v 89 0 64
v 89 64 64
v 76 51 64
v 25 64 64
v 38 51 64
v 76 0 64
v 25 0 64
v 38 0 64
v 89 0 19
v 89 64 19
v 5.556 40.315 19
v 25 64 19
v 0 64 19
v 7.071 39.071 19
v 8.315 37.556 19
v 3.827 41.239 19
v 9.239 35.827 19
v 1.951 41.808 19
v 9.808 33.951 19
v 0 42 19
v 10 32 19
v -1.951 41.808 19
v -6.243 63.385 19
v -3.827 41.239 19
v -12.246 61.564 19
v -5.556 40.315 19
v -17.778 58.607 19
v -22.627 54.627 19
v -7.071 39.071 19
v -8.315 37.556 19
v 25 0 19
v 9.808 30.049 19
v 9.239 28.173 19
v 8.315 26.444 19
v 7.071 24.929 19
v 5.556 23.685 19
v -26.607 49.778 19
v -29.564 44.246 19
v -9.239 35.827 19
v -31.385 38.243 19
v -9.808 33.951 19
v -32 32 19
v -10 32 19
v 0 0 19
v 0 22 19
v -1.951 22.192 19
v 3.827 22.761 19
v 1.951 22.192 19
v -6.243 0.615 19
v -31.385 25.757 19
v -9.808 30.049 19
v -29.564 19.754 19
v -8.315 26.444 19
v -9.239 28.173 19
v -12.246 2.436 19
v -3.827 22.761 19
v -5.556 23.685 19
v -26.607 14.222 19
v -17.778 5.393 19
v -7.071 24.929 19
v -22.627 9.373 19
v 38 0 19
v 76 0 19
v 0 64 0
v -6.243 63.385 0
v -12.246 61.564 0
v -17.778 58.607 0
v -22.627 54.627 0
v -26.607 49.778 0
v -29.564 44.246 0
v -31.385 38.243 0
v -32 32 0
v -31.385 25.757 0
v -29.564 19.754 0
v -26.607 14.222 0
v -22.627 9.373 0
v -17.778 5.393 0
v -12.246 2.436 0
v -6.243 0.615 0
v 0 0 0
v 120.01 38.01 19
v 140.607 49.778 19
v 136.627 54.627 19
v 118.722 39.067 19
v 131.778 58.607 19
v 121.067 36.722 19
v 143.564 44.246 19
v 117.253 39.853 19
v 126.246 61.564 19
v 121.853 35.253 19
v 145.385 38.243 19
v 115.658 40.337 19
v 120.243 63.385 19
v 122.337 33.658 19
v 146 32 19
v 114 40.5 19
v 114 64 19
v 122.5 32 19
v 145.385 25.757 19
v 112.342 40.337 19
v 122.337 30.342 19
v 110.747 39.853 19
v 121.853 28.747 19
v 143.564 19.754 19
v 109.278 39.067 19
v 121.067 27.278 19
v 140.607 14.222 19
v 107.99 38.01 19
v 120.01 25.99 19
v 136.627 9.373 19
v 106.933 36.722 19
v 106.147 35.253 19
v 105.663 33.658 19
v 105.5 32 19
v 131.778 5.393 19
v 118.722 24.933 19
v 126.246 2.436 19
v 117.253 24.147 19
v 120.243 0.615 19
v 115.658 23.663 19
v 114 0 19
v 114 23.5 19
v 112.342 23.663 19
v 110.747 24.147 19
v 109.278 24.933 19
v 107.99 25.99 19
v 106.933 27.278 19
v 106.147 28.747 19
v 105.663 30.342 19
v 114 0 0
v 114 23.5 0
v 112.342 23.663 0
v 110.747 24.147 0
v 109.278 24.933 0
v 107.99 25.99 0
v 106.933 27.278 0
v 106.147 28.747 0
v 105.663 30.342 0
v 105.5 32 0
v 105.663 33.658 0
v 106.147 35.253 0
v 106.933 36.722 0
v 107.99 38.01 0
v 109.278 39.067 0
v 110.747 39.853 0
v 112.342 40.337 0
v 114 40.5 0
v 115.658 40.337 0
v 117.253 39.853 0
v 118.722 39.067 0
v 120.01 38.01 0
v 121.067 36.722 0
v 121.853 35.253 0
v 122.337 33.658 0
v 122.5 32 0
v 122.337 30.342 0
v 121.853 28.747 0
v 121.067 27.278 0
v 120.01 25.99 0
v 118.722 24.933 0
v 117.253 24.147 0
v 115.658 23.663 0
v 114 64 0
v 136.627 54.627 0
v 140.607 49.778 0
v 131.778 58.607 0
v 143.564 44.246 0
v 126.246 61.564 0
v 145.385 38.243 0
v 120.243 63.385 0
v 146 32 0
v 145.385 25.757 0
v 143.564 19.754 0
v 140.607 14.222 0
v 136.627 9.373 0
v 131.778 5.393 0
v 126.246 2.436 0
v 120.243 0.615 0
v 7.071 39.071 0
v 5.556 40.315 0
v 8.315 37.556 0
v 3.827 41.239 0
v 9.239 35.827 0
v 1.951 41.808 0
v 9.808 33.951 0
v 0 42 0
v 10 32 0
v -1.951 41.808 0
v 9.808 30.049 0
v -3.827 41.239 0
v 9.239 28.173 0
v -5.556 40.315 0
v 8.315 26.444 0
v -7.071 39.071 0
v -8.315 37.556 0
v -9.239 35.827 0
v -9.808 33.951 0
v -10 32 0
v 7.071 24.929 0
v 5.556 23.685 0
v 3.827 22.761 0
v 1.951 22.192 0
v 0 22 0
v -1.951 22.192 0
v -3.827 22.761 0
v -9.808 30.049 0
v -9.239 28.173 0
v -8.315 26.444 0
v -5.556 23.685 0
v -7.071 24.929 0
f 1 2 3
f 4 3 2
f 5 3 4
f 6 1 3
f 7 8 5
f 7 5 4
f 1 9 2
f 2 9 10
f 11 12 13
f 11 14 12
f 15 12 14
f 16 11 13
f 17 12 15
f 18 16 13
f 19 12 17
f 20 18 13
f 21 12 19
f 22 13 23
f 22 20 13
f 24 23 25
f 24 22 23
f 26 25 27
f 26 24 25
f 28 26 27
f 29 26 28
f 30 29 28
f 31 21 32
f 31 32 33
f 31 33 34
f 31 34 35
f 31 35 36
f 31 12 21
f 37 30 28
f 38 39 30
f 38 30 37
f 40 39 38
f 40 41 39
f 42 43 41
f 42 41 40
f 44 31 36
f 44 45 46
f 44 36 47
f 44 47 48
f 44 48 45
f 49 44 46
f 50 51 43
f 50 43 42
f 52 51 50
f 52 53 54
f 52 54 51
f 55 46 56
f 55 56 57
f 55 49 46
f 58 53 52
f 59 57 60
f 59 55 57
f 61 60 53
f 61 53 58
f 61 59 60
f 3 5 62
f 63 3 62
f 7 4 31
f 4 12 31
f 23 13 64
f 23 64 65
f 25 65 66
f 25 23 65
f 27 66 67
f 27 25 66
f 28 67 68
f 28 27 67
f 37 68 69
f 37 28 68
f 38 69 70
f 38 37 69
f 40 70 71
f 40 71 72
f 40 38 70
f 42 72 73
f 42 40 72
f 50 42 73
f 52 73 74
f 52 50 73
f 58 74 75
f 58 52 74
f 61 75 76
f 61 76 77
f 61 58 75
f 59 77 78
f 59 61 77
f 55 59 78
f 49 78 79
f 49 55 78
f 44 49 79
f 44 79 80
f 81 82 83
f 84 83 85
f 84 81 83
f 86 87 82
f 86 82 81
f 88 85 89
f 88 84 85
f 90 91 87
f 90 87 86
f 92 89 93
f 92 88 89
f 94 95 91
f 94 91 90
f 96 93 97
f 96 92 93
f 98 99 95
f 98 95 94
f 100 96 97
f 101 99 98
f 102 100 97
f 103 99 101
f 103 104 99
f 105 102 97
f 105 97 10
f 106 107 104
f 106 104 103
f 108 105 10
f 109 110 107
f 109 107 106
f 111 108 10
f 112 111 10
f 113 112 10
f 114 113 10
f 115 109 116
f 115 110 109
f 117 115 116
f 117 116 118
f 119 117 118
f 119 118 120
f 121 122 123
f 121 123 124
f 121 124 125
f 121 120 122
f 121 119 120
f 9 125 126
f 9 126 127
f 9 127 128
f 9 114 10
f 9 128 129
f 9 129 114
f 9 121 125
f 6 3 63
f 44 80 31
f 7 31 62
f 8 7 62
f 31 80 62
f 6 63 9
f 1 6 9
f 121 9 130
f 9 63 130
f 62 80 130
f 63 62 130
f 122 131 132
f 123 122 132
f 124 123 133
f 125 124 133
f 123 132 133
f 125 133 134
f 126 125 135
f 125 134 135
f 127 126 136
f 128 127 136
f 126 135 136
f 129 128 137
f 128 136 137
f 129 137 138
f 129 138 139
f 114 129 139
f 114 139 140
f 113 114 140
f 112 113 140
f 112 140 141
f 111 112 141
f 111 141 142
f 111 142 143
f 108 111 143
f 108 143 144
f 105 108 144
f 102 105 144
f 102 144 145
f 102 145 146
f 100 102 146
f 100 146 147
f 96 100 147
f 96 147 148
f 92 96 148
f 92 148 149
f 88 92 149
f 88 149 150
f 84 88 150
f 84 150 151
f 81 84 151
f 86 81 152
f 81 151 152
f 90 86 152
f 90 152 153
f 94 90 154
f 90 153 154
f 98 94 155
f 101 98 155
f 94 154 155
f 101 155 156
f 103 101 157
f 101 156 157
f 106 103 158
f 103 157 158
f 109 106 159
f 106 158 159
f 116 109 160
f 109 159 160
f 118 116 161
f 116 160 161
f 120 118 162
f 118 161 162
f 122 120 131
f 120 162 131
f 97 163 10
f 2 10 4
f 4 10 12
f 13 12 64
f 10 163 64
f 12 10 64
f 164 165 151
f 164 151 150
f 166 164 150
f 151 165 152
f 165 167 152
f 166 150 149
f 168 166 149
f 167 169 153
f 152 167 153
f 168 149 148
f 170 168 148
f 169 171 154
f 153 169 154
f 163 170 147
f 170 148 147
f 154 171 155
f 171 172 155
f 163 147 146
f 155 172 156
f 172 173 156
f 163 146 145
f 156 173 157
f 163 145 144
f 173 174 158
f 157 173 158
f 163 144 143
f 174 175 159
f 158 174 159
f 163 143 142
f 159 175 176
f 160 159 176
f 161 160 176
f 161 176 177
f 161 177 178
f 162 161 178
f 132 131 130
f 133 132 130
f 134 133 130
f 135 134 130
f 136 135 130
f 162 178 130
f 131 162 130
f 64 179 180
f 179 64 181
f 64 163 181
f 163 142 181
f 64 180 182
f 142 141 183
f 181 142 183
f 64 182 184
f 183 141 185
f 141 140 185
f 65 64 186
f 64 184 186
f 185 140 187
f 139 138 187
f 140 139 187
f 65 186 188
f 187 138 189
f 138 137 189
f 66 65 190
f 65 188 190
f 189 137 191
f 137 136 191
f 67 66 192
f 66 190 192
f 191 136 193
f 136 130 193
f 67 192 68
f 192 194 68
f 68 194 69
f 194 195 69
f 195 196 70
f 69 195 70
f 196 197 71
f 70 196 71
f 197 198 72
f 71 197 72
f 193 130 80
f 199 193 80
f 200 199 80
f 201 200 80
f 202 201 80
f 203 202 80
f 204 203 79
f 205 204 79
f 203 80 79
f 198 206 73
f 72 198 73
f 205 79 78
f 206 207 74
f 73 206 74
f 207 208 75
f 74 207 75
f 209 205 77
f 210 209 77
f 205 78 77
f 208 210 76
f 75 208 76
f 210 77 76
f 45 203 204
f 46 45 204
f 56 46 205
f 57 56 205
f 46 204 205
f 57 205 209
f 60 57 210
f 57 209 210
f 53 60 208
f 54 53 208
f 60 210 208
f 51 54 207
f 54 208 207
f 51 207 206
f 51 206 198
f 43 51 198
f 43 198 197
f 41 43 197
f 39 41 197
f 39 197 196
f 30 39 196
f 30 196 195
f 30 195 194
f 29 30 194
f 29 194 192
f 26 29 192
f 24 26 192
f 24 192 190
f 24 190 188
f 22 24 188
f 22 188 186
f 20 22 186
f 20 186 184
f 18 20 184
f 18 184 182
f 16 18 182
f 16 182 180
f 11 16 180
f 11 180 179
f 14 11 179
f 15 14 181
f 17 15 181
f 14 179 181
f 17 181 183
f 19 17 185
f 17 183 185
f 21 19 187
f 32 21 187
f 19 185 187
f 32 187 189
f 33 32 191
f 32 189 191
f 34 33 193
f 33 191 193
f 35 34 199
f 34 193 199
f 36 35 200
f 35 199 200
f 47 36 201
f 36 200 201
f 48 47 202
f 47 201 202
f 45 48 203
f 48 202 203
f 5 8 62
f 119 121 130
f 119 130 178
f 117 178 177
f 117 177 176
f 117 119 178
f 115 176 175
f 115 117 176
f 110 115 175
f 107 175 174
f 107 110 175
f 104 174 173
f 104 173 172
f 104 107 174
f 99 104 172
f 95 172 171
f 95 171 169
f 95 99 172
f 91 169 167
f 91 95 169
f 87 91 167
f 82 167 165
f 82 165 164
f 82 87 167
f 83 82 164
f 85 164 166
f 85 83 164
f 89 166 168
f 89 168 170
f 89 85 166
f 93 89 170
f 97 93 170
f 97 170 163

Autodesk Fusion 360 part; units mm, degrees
sketch "Sketch1" plane through (0, 0, 0) normal (0, 0, 1) x (1, 0, 0)
  line L0 (0, 0) -> (114, 0)
  line L1 (114, 0) -> (114, 64)
  line L2 (114, 64) -> (0, 64)
  line L3 (0, 64) -> (0, 0)
  dimension "d1" = 114
  dimension "d2" = 64
extrude "Extrude1" add sketch "Sketch1" along normal blind 19
sketch "Sketch2" plane through (0, 0, 19) normal (0, 0, 1) x (-1, 0, 0)
  line L0 (0, -64) -> (0, 0)
  line L1 (0, 0) -> (-114, 0)
  line L2 (-114, 0) -> (-114, -64)
  line L3 (-114, -64) -> (0, -64)
  line L4 (0, 0) -> (-25, 0)
  line L5 (-25, 0) -> (-89, 0)
  line L6 (-89, 0) -> (-89, -64)
  line L7 (-89, -64) -> (-25, -64)
  line L8 (-25, -64) -> (-25, 0)
  dimension "d5" = 25
  dimension "d6" = 64
extrude "Extrude2" add sketch "Sketch2" along normal blind 45 contours L1 L3 L5 L6 L7 L8
sketch "Sketch4" plane through (0, 0, 64) normal (0, 0, 1) x (-1, 0, 0)
  line L0 (-25, -64) -> (-25, 0)
  line L1 (-25, 0) -> (-89, 0)
  line L2 (-89, 0) -> (-89, -64)
  line L3 (-89, -64) -> (-25, -64)
  line L4 (-25, 0) -> (-38, 0)
  line L5 (-38, 0) -> (-38, -51)
  line L6 (-38, -51) -> (-76, -51)
  line L7 (-76, -51) -> (-76, 0)
  line L8 (-38, 0) -> (-76, 0)
  dimension "d12" = 13
  dimension "d13" = 51
  dimension "d14" = 38
extrude "Extrude3" cut sketch "Sketch4" against normal blind 45 contours L1 L5 L6 L7 L8
sketch "Sketch5" plane through (38, 0, 0) normal (1, 0, 0) x (0, 1, 0)
  line L0 (51, 64) -> (0, 64)
  line L1 (0, 64) -> (0, 19)
  line L2 (0, 19) -> (51, 19)
  line L3 (51, 19) -> (51, 64)
  line L4 (51, 64) -> (0, 19)
  line L5 (51, 19) -> (0, 19)
  line L6 (51, 19) -> (51, 64)
extrude "Extrude4" add sketch "Sketch5" along normal blind 38 contours L2 L3 L4 L5 L6
sketch "Sketch6" plane through (0, 0, 19) normal (0, 0, 1) x (-1, 0, 0)
  line L0 (-89, -64) -> (-89, 0)
  line L1 (-89, 0) -> (-114, 0)
  line L2 (-114, 0) -> (-114, -64)
  line L3 (-114, -64) -> (-89, -64)
  circle A0 centre (-114, -32) radius 32
  line L4 (-114, -64) -> (-114, 0)
  dimension "d31" = 64
extrude "Extrude5" add sketch "Sketch6" against normal blind 19 contours L2 A0 L4
hole "Hole1" at (114, 32, 19) direction (0, 0, -1) diameter 17 depth 22 tip angle 118
sketch "Sketch7" plane through (0, 0, 19) normal (0, 0, 1) x (-1, 0, 0)
  line L0 (-25, 0) -> (-25, -64)
  line L1 (-25, -64) -> (0, -64)
  line L2 (0, -64) -> (0, 0)
  line L3 (0, 0) -> (-25, 0)
  circle A0 centre (0, -32) radius 32
  line L4 (0, -64) -> (0, 0)
  dimension "d25" = 64
extrude "Extrude6" add sketch "Sketch7" against normal blind 19 contours L2 A0 L4
hole "Hole2" at (0, 32, 19) direction (0, 0, -1) diameter 20 depth 22 tip angle 118
